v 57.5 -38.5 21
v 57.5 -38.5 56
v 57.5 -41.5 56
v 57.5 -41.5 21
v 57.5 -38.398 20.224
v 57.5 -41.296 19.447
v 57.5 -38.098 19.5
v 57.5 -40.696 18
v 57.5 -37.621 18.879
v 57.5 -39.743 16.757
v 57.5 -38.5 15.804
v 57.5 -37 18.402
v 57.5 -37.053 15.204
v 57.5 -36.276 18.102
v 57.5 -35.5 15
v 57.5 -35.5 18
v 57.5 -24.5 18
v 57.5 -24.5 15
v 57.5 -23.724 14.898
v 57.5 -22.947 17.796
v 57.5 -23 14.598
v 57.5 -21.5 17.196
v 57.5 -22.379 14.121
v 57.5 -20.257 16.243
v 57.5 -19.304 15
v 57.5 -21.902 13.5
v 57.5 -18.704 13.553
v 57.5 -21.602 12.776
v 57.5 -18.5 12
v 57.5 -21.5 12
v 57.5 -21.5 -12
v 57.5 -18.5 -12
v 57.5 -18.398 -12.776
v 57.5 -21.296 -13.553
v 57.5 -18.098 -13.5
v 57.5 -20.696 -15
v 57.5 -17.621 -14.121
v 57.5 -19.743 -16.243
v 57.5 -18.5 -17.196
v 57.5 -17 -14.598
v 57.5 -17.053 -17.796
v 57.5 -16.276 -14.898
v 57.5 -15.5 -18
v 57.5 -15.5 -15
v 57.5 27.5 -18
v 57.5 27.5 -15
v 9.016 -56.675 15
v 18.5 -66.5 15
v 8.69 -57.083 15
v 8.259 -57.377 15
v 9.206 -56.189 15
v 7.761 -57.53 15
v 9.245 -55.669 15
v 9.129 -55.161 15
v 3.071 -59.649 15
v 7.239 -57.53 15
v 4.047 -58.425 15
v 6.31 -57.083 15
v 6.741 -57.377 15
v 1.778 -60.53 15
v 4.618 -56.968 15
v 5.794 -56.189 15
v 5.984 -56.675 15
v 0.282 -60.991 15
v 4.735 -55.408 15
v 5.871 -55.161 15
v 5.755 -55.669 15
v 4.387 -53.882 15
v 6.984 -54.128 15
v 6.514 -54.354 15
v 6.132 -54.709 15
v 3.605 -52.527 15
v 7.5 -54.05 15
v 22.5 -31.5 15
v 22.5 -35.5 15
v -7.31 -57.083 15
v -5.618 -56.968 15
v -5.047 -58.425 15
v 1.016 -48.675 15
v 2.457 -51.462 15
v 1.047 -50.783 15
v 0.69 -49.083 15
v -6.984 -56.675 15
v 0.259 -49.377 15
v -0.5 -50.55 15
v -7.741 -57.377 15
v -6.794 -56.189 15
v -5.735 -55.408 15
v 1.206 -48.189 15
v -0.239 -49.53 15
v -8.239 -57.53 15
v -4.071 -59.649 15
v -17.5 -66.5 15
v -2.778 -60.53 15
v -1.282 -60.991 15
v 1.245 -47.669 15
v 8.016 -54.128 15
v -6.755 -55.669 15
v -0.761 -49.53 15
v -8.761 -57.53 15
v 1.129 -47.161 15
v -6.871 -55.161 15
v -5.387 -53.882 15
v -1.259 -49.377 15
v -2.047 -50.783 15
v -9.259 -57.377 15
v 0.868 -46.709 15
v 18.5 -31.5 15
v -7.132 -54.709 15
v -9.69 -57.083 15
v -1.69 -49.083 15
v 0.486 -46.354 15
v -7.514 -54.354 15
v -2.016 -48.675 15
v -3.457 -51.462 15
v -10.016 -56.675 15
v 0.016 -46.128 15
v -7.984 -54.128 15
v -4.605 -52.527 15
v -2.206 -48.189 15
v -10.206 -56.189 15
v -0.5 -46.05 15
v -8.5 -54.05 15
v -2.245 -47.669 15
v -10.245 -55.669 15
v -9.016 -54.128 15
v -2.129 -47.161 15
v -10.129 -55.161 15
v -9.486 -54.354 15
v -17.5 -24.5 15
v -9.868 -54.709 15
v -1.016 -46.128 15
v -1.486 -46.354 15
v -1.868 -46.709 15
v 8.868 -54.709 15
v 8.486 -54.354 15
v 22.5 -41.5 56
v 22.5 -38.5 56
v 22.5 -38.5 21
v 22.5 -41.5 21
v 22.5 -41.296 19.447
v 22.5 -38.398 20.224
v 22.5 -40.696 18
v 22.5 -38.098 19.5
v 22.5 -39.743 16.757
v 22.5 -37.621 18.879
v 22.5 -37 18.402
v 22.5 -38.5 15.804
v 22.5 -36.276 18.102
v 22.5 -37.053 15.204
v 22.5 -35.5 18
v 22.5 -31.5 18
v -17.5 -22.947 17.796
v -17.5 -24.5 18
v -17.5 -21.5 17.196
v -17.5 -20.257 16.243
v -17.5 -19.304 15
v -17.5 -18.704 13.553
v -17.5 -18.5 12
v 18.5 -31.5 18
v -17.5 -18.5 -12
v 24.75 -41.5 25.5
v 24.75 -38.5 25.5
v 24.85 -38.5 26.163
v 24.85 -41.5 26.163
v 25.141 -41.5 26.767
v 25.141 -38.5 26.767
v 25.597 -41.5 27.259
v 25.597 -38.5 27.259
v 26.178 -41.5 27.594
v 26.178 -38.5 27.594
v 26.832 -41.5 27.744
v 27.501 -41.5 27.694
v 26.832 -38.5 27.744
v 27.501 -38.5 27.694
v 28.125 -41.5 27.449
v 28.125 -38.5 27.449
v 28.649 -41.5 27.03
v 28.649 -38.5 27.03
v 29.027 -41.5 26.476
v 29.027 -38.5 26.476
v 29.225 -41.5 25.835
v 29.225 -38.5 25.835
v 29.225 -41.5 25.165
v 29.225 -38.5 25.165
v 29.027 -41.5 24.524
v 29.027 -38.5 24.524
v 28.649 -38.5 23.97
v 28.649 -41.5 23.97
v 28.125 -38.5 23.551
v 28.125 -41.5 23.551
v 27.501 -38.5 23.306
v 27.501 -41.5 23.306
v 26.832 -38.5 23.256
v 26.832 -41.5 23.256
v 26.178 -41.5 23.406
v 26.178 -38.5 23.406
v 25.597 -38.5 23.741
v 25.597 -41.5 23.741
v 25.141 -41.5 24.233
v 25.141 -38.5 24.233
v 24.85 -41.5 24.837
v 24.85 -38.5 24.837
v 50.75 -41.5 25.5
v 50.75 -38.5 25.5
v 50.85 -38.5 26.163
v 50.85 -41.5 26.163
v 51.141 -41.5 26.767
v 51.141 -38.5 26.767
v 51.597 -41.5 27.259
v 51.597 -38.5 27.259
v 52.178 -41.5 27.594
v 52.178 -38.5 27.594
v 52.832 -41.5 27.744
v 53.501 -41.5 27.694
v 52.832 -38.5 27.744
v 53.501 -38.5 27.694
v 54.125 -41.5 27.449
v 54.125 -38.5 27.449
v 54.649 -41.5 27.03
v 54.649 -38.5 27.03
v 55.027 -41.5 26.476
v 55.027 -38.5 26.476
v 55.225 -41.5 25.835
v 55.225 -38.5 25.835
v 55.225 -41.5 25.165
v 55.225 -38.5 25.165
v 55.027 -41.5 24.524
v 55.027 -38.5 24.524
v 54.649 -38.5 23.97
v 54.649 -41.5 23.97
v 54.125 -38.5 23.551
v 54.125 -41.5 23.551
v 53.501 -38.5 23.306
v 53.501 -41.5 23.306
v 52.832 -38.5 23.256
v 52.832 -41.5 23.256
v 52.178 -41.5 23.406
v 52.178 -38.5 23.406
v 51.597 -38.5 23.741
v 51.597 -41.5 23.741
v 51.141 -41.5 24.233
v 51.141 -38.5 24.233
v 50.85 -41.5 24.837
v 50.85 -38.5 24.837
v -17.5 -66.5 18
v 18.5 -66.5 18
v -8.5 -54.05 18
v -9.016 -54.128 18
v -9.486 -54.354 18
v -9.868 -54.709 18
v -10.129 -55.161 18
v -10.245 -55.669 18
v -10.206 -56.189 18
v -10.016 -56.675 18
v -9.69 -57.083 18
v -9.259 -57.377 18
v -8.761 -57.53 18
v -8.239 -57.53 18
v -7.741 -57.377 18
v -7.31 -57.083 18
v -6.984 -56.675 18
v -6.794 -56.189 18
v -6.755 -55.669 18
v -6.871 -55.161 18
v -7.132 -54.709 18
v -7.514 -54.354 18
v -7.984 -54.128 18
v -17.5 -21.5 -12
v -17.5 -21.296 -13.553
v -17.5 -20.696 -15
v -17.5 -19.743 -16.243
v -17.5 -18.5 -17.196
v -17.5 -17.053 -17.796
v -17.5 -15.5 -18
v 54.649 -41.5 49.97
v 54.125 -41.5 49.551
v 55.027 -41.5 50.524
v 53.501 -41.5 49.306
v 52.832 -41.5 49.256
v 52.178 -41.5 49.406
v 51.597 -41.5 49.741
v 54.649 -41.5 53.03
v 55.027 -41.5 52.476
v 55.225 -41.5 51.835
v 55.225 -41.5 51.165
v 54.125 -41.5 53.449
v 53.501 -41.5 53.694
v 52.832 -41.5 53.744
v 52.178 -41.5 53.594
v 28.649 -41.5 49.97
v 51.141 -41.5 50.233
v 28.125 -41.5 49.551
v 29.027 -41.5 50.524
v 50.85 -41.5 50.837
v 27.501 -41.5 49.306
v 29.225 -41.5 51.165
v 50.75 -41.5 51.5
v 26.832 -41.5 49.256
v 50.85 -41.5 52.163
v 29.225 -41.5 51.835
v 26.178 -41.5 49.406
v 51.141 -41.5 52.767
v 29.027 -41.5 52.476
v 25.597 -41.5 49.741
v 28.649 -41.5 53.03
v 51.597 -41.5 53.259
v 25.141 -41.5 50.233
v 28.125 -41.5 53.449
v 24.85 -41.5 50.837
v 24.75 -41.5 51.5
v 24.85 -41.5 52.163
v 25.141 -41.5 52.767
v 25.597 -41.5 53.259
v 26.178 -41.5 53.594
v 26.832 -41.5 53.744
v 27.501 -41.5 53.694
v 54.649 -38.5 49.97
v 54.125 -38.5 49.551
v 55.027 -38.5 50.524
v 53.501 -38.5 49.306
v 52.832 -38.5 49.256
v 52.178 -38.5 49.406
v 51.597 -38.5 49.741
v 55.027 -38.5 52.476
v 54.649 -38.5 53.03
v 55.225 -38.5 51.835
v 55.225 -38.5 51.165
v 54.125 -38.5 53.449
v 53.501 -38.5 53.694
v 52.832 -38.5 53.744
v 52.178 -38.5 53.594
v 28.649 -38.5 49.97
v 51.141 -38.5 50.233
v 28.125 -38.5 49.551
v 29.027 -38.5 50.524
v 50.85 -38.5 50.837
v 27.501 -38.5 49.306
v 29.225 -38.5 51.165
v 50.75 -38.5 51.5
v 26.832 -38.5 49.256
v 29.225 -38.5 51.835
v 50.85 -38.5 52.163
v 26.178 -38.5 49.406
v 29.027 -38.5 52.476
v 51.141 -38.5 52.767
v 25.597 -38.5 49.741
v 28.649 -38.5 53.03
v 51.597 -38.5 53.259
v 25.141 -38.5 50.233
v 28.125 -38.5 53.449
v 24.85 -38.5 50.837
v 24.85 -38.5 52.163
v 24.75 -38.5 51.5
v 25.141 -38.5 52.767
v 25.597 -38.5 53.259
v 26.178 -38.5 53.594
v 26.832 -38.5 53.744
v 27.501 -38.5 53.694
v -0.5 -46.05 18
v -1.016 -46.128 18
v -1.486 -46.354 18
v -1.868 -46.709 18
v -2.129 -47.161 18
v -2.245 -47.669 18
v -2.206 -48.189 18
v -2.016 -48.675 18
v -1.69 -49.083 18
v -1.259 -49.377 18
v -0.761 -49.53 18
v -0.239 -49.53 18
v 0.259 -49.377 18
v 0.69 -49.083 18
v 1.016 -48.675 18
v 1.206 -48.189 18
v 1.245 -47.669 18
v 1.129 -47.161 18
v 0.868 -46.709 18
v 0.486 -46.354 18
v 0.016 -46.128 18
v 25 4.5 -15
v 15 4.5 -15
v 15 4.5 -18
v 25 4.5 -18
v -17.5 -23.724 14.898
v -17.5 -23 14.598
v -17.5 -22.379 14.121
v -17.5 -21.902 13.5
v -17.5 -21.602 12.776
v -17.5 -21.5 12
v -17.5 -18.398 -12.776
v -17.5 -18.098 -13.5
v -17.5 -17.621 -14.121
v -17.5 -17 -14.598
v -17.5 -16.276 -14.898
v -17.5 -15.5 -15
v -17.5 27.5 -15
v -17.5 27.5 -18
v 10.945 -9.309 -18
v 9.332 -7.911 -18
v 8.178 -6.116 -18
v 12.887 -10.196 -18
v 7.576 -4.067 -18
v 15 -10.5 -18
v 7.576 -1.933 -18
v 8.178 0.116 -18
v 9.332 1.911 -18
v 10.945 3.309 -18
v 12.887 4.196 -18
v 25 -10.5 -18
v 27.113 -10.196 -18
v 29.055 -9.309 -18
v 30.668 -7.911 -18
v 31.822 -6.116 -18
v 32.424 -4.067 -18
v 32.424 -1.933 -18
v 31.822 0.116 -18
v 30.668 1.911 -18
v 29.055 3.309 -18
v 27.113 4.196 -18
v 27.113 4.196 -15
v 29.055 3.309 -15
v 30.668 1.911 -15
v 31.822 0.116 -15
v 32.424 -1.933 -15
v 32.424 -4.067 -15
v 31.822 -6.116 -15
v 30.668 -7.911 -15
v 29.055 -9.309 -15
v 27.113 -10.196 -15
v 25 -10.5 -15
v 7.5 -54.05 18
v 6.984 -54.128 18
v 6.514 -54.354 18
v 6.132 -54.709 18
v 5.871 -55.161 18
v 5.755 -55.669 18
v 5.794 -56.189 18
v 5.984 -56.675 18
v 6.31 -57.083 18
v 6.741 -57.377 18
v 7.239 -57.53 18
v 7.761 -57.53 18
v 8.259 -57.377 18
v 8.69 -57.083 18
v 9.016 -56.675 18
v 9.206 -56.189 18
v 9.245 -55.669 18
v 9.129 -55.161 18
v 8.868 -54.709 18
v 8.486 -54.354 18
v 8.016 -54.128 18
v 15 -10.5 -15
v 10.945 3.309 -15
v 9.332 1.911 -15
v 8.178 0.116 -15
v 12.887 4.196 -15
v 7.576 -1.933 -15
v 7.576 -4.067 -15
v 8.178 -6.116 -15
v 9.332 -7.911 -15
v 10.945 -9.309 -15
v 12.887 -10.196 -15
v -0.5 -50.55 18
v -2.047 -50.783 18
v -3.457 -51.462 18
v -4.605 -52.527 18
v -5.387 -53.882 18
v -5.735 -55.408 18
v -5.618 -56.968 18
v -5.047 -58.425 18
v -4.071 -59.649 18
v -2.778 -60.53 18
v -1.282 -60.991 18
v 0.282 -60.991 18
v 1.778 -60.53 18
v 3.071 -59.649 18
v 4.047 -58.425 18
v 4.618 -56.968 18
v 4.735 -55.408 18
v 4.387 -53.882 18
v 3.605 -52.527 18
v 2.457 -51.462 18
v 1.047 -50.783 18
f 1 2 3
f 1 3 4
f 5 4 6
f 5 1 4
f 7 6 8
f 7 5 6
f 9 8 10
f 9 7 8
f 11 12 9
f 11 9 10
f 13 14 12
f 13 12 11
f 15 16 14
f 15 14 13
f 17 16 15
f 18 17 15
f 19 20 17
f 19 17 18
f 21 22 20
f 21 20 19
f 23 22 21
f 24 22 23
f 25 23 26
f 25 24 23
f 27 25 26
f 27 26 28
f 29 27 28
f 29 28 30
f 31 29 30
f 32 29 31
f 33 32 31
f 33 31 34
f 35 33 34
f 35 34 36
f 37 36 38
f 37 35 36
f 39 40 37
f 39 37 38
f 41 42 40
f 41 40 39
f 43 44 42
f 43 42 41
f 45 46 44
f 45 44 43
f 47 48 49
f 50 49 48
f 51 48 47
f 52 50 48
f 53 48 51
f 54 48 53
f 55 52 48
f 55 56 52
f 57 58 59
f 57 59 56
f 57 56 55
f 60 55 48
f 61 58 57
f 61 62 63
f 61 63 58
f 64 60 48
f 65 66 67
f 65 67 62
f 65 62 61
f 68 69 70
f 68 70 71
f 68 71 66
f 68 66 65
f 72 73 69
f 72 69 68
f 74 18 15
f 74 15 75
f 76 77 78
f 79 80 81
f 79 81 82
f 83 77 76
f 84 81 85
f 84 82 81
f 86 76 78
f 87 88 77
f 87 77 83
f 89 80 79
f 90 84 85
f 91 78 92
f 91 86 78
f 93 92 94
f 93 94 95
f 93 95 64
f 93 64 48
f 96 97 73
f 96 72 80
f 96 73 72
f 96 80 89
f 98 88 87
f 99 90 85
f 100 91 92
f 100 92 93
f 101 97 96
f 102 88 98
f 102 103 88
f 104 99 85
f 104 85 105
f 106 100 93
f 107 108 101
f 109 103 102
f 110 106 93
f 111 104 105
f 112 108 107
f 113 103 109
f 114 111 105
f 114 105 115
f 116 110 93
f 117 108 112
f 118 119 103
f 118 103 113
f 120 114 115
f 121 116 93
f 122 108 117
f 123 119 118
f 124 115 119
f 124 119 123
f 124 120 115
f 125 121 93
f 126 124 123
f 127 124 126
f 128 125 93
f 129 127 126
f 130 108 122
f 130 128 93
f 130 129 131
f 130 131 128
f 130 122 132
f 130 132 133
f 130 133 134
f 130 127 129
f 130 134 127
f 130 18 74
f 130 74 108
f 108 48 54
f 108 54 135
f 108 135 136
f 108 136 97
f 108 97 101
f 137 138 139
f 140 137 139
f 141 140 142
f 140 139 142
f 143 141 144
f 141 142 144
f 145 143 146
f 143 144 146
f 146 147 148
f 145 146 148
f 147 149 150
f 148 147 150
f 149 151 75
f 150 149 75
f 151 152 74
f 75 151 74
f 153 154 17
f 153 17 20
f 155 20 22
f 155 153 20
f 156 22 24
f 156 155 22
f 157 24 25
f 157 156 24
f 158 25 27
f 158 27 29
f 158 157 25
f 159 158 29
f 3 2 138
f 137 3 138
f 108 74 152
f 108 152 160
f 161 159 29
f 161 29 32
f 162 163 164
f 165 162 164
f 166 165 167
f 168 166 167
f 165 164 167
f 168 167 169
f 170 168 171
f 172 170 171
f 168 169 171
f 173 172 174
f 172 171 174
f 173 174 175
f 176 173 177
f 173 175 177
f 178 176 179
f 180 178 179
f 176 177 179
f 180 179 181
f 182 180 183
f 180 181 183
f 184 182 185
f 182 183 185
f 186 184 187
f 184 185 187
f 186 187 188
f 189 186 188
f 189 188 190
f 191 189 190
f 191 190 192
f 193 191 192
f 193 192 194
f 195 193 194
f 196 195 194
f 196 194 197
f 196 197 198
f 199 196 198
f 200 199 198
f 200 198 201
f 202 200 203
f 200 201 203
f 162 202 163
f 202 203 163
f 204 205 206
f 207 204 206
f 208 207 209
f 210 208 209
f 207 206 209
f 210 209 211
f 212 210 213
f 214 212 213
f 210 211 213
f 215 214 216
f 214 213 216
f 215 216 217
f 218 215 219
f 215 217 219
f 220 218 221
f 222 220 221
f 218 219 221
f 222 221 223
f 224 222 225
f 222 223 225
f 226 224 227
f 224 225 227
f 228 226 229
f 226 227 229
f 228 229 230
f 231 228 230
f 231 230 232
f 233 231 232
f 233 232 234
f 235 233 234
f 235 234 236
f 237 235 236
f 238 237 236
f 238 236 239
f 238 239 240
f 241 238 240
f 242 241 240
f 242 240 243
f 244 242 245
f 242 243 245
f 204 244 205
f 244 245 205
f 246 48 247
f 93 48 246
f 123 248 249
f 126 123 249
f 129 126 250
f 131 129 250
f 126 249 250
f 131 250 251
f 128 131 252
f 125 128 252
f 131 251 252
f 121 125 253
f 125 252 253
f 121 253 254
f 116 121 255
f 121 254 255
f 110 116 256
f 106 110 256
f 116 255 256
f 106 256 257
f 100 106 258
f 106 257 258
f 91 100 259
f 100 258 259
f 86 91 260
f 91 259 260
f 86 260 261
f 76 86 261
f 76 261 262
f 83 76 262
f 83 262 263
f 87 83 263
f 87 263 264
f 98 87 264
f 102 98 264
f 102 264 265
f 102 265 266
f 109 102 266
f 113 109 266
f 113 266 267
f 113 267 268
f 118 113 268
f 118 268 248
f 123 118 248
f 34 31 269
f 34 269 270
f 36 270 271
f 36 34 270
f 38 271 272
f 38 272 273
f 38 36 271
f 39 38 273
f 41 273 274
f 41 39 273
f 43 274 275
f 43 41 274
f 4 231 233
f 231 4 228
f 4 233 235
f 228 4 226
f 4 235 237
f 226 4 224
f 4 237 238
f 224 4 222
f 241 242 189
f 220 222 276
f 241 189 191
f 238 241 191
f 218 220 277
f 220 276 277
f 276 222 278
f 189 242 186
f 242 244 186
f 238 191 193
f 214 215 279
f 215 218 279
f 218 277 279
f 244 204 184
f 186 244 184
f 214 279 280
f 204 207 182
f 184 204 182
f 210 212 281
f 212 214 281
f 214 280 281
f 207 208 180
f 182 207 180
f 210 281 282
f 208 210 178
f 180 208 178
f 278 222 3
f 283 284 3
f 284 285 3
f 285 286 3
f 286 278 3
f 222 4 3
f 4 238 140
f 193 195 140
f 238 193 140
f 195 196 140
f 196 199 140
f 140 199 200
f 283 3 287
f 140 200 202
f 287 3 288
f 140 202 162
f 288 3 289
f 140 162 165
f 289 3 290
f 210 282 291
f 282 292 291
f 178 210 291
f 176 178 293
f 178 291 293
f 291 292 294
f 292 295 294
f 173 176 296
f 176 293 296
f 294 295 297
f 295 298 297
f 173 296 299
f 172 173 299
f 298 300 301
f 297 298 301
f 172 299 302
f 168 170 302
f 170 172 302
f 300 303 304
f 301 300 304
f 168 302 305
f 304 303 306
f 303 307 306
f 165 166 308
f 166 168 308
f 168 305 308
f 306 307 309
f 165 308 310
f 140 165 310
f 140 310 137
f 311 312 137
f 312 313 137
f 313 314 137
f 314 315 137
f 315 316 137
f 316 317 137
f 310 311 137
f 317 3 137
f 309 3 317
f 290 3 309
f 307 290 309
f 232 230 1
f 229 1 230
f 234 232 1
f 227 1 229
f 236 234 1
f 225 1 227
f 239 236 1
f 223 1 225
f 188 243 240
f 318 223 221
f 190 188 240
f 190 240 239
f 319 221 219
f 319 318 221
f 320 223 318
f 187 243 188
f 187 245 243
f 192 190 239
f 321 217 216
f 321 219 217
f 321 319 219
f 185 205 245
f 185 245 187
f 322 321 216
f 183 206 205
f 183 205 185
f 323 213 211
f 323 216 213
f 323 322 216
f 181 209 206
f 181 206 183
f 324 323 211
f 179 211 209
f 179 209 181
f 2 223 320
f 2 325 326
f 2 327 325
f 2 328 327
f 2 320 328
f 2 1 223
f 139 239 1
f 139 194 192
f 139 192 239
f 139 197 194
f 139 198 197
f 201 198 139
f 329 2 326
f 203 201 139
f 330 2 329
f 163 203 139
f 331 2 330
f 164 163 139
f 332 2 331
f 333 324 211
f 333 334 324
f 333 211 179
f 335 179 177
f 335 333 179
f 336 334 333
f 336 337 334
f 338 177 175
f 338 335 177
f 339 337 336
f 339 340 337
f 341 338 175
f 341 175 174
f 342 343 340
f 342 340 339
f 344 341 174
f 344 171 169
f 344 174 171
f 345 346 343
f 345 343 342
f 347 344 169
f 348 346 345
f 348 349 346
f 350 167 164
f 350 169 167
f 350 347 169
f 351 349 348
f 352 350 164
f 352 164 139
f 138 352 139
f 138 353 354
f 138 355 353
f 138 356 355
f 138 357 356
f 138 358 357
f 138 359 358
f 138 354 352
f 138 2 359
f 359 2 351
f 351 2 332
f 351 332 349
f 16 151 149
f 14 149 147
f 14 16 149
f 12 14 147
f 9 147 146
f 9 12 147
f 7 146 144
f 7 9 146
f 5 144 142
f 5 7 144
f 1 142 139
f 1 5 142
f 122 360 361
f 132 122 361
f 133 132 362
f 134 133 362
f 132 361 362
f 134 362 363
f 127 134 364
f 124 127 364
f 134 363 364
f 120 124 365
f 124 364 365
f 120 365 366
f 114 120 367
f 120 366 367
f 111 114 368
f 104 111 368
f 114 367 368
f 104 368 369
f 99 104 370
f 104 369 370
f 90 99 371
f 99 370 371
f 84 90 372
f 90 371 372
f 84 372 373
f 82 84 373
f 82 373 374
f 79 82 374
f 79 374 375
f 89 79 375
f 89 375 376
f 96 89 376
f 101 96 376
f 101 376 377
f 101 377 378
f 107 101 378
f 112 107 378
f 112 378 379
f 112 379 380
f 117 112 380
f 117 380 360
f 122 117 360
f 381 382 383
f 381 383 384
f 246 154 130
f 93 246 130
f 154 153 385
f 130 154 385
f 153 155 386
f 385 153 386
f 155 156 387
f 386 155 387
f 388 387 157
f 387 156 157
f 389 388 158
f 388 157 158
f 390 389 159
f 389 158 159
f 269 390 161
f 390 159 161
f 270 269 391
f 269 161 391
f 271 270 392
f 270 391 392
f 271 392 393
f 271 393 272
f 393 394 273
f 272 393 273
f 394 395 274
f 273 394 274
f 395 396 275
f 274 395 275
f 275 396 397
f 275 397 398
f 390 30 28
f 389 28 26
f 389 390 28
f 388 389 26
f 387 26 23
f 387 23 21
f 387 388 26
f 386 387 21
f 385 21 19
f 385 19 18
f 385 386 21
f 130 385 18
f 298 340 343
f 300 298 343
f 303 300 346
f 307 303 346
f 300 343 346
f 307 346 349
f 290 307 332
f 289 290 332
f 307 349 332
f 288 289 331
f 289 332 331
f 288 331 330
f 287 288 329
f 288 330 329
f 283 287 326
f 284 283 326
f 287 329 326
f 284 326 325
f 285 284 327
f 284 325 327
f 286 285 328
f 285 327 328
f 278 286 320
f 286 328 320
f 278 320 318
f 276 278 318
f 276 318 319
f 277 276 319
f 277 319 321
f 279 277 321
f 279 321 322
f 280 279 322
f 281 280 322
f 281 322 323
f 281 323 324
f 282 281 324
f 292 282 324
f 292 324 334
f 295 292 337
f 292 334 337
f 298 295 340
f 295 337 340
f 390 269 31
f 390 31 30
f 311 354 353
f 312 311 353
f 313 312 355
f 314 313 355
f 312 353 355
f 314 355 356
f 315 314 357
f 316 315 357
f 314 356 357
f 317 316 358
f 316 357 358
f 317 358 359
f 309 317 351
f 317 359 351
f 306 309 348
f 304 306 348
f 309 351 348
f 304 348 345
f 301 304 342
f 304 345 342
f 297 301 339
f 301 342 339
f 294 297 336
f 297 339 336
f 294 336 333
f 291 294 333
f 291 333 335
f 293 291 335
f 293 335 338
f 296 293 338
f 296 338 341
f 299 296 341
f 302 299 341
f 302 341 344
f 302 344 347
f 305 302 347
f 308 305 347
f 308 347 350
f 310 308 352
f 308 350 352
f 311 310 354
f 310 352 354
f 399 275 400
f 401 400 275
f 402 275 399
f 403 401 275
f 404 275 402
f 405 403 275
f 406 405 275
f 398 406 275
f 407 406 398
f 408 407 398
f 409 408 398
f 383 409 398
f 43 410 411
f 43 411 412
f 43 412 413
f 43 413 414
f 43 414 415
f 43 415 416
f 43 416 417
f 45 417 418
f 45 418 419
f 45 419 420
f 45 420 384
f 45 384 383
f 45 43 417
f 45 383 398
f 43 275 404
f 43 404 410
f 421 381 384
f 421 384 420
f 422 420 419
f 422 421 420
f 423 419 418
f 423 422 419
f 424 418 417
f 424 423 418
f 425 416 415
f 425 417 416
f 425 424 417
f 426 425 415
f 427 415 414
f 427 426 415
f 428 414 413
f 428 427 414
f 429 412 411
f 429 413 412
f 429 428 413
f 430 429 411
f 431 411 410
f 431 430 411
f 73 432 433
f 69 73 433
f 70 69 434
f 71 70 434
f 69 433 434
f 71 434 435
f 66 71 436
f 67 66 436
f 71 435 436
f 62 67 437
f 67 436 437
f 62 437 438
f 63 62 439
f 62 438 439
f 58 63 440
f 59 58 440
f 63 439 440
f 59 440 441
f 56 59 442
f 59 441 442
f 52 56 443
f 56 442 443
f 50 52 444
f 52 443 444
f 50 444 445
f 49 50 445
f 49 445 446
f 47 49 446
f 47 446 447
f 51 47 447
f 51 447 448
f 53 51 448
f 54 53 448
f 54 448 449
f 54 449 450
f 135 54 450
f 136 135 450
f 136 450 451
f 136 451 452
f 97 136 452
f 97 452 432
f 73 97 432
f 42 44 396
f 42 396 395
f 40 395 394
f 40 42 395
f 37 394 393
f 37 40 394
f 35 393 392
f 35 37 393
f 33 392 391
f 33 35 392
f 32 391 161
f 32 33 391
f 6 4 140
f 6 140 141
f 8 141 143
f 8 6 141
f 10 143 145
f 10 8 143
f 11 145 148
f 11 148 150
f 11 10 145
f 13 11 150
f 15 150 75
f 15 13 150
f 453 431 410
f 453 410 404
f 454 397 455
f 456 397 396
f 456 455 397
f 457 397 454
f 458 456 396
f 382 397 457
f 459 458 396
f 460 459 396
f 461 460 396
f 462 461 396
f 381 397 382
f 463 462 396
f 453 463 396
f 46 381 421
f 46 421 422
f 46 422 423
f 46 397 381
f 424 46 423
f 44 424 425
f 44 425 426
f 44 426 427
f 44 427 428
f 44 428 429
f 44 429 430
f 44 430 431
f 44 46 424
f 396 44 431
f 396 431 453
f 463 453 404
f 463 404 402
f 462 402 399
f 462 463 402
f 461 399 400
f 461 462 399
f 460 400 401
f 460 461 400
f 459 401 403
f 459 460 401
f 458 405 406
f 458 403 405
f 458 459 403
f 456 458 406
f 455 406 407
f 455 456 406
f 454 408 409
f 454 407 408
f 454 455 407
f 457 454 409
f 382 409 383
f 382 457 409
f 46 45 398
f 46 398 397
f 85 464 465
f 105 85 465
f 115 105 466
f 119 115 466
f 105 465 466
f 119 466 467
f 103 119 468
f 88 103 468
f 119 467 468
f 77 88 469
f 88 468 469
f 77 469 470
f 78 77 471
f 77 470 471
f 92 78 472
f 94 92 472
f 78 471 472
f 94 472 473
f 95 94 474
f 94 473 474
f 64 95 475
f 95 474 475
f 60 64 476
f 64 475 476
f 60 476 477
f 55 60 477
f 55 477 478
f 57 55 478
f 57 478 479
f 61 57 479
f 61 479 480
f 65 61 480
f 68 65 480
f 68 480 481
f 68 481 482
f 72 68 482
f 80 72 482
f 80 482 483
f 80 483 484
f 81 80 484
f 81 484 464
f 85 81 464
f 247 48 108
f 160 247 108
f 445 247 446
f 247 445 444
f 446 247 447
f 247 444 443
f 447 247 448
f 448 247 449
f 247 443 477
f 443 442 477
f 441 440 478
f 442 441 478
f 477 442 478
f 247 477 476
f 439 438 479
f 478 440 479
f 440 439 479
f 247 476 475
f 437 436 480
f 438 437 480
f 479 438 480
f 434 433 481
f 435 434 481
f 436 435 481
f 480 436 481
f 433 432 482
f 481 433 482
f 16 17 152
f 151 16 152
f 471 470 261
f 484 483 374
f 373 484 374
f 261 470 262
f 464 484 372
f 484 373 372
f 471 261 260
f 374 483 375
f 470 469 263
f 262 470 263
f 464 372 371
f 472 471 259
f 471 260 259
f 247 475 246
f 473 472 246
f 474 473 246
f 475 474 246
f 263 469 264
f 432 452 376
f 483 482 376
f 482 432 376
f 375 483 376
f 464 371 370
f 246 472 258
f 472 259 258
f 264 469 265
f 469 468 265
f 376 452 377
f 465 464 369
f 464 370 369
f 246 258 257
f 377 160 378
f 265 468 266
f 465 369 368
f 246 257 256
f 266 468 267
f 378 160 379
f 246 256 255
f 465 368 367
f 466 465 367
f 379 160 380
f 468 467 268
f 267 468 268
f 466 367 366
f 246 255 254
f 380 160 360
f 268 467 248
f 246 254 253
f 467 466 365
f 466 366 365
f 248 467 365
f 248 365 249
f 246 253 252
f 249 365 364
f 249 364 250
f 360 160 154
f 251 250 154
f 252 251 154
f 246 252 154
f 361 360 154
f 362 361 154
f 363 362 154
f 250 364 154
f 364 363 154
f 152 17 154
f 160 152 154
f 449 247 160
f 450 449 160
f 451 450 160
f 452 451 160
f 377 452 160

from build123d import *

# Parameters (mm, degrees)
SKETCH1_W                    = 35
SKETCH1_H                    = 35
SKETCH1_R                    = 2.25
BASE_FLANGE1_DEPTH           = 3
EDGE_FLANGE1_DEPTH           = 35
SKETCH9_W                    = 36
SKETCH9_H                    = 35
BOSS_EXTRUDE1_DEPTH          = 3
EDGE_FLANGE2_STRIP_W         = 18
EDGE_FLANGE2_STRIP_H         = 3
EDGE_FLANGE2_STRIP_CUT_DEPTH = 75
EDGE_FLANGE2_DEPTH           = 75
EDGE_FLANGE3_STRIP_W         = 18
EDGE_FLANGE3_STRIP_H         = 3
EDGE_FLANGE3_STRIP_CUT_DEPTH = 75
EDGE_FLANGE3_DEPTH           = 75
SKETCH16_R                   = 5.25
SKETCH16_R_2                 = 1.75
CUT_EXTRUDE1_DEPTH           = 10
CUT_EXTRUDE2_DEPTH           = 10
BODY_MOVE_COPY1_ANGLE        = 180


# Sheet-metal steps are written as plain solids
with BuildPart() as part:
    # Sketch1 → Base-Flange1 (new body)
    with BuildSketch(Plane.XY):
        Rectangle(SKETCH1_W, SKETCH1_H)
        with Locations((-13, 13)):
            Circle(SKETCH1_R, mode=Mode.SUBTRACT)
        with Locations((13, 13)):
            Circle(SKETCH1_R, mode=Mode.SUBTRACT)
        with Locations((13, -13)):
            Circle(SKETCH1_R, mode=Mode.SUBTRACT)
        with Locations((-13, -13)):
            Circle(SKETCH1_R, mode=Mode.SUBTRACT)
    extrude(amount=-BASE_FLANGE1_DEPTH)

    # Edge-Flange1 section (across the edge) → Edge-Flange1 (add)
    with BuildSketch(Plane(origin=(-17.5, -20.5, 0), x_dir=(0, 1, 0), z_dir=(1, 0, 0))):
        with BuildLine():
            Line((-3, 3), (-3, 17))
            Line((-3, 17), (0, 17))
            Line((0, 17), (0, 3))
            ThreePointArc((0, 3), (0.878679656, 0.878679656), (3, 0))
            Line((3, 0), (3, -3))
            ThreePointArc((3, -3), (-1.242640687, -1.242640687), (-3, 3))
        make_face()
    extrude(amount=EDGE_FLANGE1_DEPTH)

    # Sketch9 → Boss-Extrude1 (add)
    with BuildSketch(Plane.XZ.offset(23.5)):
        Polygon((57.5, 17), (17.5, 17), (17.5, 7), (21.5, 7), (57.5, 7), align=None)
        with Locations((39.5, -10.5)):
            Rectangle(SKETCH9_W, SKETCH9_H)
    extrude(amount=-BOSS_EXTRUDE1_DEPTH)

    # Edge-Flange2 strip (across the edge) → Edge-Flange2 strip cut (cut)
    with BuildSketch(Plane(origin=(57.5, -23.5, 17), x_dir=(0, 0, -1), z_dir=(-1, 0, 0))):
        with Locations((-6, -1.5)):
            Rectangle(EDGE_FLANGE2_STRIP_W, EDGE_FLANGE2_STRIP_H)
    extrude(amount=EDGE_FLANGE2_STRIP_CUT_DEPTH, mode=Mode.SUBTRACT)

    # Edge-Flange2 section (across the edge) → Edge-Flange2 (add)
    with BuildSketch(Plane(origin=(57.5, -23.5, 17), x_dir=(0, 0, -1), z_dir=(-1, 0, 0))):
        with BuildLine():
            Line((-3, 3), (-3, 30))
            Line((-3, 30), (0, 30))
            Line((0, 30), (0, 3))
            ThreePointArc((0, 3), (0.878679656, 0.878679656), (3, 0))
            Line((3, 0), (3, -3))
            ThreePointArc((3, -3), (-1.242640687, -1.242640687), (-3, 3))
        make_face()
    extrude(amount=EDGE_FLANGE2_DEPTH)

    # Edge-Flange3 strip (across the edge) → Edge-Flange3 strip cut (cut)
    with BuildSketch(Plane(origin=(-17.5, -53.5, 20), x_dir=(0, 1, 0), z_dir=(1, 0, 0))):
        with Locations((-6, -1.5)):
            Rectangle(EDGE_FLANGE3_STRIP_W, EDGE_FLANGE3_STRIP_H)
    extrude(amount=EDGE_FLANGE3_STRIP_CUT_DEPTH, mode=Mode.SUBTRACT)

    # Edge-Flange3 section (across the edge) → Edge-Flange3 (add)
    with BuildSketch(Plane(origin=(-17.5, -53.5, 20), x_dir=(0, 1, 0), z_dir=(1, 0, 0))):
        with BuildLine():
            Line((-3, 3), (-3, 46))
            Line((-3, 46), (0, 46))
            Line((0, 46), (0, 3))
            ThreePointArc((0, 3), (0.878679656, 0.878679656), (3, 0))
            Line((3, 0), (3, -3))
            ThreePointArc((3, -3), (-1.242640687, -1.242640687), (-3, 3))
        make_face()
    extrude(amount=EDGE_FLANGE3_DEPTH)

    # Sketch16 → Cut-Extrude1 (cut)
    with BuildSketch(Plane(origin=(0, -20.5, 0), x_dir=(1, 0, 0), z_dir=(0, 1, 0))):
        with Locations(Location((40.5, 17.3, 0), (0, 0, 270))):
            Circle(SKETCH16_R)
        with Locations(Location((40.5, 9.3, 0), (0, 0, 270))):
            Circle(SKETCH16_R_2)
        with Locations(Location((48.5, 17.3, 0), (0, 0, 270))):
            Circle(SKETCH16_R_2)
        with Locations(Location((32.5, 17.3, 0), (0, 0, 270))):
            Circle(SKETCH16_R_2)
    extrude(amount=-CUT_EXTRUDE1_DEPTH, mode=Mode.SUBTRACT)

    # Sketch17 → Cut-Extrude2 (cut)
    with BuildSketch(Plane(origin=(0, -53.5, 0), x_dir=(1, 0, 0), z_dir=(0, 1, 0))):
        with BuildLine():
            Line((25, -43), (15, -43))
            ThreePointArc((15, -43), (7.5, -35.5), (15, -28))
            Line((15, -28), (25, -28))
            ThreePointArc((25, -28), (32.5, -35.5), (25, -43))
        make_face()
    extrude(amount=-CUT_EXTRUDE2_DEPTH, mode=Mode.SUBTRACT)


with BuildPart() as part_1:
    # Body-Move/Copy1: moved
    add(part.part.moved(Location((0, 0, 0))).rotate(Axis((20, -19.25, 19.25), (-4.937700262163626e-15, 0.7071067811864181, 0.707106781186677)), BODY_MOVE_COPY1_ANGLE))


solid = part_1.part
